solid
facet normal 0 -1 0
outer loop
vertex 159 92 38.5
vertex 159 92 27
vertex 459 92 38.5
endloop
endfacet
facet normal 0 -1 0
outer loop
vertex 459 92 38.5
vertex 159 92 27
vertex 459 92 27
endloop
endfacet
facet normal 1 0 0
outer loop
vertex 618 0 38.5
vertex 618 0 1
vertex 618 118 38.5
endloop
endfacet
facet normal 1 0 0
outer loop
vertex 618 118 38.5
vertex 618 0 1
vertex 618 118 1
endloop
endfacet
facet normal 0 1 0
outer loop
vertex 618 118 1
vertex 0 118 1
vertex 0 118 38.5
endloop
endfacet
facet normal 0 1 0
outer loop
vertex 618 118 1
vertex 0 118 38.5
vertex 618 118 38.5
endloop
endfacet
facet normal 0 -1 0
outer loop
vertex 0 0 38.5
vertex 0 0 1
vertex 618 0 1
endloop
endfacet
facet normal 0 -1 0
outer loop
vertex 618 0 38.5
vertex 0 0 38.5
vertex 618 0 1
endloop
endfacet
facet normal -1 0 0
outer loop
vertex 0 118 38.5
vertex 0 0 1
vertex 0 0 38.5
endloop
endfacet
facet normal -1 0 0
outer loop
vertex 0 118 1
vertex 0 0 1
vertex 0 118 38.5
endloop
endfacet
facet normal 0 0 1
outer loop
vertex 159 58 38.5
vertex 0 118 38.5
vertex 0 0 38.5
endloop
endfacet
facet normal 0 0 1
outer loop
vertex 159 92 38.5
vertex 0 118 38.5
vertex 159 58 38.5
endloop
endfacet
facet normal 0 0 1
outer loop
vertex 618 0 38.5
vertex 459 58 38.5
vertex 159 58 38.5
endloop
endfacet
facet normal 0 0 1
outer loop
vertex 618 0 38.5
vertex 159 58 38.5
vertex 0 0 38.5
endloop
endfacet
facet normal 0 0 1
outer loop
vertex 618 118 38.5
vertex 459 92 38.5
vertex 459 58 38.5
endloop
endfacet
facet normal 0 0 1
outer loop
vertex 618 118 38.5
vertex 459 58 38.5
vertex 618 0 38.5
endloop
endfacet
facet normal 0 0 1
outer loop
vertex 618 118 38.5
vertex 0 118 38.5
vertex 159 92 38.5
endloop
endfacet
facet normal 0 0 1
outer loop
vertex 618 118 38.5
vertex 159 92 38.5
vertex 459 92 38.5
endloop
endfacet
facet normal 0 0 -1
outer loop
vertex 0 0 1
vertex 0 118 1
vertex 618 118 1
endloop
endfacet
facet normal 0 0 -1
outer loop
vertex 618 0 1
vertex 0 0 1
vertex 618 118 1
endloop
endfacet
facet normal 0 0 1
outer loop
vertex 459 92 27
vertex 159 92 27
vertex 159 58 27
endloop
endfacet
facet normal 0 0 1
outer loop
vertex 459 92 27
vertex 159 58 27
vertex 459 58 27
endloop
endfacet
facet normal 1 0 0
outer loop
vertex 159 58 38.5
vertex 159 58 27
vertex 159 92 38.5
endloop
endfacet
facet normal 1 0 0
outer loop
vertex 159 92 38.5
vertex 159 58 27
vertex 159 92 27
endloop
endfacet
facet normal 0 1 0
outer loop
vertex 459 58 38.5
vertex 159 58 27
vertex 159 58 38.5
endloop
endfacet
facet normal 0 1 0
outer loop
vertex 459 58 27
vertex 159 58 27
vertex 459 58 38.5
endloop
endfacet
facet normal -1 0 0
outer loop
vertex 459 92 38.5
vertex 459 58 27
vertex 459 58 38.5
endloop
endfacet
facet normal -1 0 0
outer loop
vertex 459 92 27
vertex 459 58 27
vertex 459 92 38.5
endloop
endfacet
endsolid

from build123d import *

# Parameters (mm, degrees)
CEK_ICECEK_ON_PU_37_5_1_START = 1
SKETCH1_W                     = 618
SKETCH1_H                     = 118
CEK_ICECEK_ON_PU_37_5_1_DEPTH = 37.5
CEK_ICECEK_ON_PU_37_5_2_START = 27
SKETCH2_W                     = 300
SKETCH2_H                     = 34
CEK_ICECEK_ON_PU_37_5_2_DEPTH = 14


with BuildPart() as part:
    # Sketch1 → CEK_icecek_on_pu_37.5_1 (new body)
    with BuildSketch(Plane.XY.offset(CEK_ICECEK_ON_PU_37_5_1_START)):
        with Locations((309, 59)):
            Rectangle(SKETCH1_W, SKETCH1_H)
    extrude(amount=CEK_ICECEK_ON_PU_37_5_1_DEPTH)

    # Sketch2 → CEK_icecek_on_pu_37.5_2 (cut)
    with BuildSketch(Plane.XY.offset(CEK_ICECEK_ON_PU_37_5_2_START)):
        with Locations((309, 75)):
            Rectangle(SKETCH2_W, SKETCH2_H)
    extrude(amount=CEK_ICECEK_ON_PU_37_5_2_DEPTH, mode=Mode.SUBTRACT)


solid = part.part
